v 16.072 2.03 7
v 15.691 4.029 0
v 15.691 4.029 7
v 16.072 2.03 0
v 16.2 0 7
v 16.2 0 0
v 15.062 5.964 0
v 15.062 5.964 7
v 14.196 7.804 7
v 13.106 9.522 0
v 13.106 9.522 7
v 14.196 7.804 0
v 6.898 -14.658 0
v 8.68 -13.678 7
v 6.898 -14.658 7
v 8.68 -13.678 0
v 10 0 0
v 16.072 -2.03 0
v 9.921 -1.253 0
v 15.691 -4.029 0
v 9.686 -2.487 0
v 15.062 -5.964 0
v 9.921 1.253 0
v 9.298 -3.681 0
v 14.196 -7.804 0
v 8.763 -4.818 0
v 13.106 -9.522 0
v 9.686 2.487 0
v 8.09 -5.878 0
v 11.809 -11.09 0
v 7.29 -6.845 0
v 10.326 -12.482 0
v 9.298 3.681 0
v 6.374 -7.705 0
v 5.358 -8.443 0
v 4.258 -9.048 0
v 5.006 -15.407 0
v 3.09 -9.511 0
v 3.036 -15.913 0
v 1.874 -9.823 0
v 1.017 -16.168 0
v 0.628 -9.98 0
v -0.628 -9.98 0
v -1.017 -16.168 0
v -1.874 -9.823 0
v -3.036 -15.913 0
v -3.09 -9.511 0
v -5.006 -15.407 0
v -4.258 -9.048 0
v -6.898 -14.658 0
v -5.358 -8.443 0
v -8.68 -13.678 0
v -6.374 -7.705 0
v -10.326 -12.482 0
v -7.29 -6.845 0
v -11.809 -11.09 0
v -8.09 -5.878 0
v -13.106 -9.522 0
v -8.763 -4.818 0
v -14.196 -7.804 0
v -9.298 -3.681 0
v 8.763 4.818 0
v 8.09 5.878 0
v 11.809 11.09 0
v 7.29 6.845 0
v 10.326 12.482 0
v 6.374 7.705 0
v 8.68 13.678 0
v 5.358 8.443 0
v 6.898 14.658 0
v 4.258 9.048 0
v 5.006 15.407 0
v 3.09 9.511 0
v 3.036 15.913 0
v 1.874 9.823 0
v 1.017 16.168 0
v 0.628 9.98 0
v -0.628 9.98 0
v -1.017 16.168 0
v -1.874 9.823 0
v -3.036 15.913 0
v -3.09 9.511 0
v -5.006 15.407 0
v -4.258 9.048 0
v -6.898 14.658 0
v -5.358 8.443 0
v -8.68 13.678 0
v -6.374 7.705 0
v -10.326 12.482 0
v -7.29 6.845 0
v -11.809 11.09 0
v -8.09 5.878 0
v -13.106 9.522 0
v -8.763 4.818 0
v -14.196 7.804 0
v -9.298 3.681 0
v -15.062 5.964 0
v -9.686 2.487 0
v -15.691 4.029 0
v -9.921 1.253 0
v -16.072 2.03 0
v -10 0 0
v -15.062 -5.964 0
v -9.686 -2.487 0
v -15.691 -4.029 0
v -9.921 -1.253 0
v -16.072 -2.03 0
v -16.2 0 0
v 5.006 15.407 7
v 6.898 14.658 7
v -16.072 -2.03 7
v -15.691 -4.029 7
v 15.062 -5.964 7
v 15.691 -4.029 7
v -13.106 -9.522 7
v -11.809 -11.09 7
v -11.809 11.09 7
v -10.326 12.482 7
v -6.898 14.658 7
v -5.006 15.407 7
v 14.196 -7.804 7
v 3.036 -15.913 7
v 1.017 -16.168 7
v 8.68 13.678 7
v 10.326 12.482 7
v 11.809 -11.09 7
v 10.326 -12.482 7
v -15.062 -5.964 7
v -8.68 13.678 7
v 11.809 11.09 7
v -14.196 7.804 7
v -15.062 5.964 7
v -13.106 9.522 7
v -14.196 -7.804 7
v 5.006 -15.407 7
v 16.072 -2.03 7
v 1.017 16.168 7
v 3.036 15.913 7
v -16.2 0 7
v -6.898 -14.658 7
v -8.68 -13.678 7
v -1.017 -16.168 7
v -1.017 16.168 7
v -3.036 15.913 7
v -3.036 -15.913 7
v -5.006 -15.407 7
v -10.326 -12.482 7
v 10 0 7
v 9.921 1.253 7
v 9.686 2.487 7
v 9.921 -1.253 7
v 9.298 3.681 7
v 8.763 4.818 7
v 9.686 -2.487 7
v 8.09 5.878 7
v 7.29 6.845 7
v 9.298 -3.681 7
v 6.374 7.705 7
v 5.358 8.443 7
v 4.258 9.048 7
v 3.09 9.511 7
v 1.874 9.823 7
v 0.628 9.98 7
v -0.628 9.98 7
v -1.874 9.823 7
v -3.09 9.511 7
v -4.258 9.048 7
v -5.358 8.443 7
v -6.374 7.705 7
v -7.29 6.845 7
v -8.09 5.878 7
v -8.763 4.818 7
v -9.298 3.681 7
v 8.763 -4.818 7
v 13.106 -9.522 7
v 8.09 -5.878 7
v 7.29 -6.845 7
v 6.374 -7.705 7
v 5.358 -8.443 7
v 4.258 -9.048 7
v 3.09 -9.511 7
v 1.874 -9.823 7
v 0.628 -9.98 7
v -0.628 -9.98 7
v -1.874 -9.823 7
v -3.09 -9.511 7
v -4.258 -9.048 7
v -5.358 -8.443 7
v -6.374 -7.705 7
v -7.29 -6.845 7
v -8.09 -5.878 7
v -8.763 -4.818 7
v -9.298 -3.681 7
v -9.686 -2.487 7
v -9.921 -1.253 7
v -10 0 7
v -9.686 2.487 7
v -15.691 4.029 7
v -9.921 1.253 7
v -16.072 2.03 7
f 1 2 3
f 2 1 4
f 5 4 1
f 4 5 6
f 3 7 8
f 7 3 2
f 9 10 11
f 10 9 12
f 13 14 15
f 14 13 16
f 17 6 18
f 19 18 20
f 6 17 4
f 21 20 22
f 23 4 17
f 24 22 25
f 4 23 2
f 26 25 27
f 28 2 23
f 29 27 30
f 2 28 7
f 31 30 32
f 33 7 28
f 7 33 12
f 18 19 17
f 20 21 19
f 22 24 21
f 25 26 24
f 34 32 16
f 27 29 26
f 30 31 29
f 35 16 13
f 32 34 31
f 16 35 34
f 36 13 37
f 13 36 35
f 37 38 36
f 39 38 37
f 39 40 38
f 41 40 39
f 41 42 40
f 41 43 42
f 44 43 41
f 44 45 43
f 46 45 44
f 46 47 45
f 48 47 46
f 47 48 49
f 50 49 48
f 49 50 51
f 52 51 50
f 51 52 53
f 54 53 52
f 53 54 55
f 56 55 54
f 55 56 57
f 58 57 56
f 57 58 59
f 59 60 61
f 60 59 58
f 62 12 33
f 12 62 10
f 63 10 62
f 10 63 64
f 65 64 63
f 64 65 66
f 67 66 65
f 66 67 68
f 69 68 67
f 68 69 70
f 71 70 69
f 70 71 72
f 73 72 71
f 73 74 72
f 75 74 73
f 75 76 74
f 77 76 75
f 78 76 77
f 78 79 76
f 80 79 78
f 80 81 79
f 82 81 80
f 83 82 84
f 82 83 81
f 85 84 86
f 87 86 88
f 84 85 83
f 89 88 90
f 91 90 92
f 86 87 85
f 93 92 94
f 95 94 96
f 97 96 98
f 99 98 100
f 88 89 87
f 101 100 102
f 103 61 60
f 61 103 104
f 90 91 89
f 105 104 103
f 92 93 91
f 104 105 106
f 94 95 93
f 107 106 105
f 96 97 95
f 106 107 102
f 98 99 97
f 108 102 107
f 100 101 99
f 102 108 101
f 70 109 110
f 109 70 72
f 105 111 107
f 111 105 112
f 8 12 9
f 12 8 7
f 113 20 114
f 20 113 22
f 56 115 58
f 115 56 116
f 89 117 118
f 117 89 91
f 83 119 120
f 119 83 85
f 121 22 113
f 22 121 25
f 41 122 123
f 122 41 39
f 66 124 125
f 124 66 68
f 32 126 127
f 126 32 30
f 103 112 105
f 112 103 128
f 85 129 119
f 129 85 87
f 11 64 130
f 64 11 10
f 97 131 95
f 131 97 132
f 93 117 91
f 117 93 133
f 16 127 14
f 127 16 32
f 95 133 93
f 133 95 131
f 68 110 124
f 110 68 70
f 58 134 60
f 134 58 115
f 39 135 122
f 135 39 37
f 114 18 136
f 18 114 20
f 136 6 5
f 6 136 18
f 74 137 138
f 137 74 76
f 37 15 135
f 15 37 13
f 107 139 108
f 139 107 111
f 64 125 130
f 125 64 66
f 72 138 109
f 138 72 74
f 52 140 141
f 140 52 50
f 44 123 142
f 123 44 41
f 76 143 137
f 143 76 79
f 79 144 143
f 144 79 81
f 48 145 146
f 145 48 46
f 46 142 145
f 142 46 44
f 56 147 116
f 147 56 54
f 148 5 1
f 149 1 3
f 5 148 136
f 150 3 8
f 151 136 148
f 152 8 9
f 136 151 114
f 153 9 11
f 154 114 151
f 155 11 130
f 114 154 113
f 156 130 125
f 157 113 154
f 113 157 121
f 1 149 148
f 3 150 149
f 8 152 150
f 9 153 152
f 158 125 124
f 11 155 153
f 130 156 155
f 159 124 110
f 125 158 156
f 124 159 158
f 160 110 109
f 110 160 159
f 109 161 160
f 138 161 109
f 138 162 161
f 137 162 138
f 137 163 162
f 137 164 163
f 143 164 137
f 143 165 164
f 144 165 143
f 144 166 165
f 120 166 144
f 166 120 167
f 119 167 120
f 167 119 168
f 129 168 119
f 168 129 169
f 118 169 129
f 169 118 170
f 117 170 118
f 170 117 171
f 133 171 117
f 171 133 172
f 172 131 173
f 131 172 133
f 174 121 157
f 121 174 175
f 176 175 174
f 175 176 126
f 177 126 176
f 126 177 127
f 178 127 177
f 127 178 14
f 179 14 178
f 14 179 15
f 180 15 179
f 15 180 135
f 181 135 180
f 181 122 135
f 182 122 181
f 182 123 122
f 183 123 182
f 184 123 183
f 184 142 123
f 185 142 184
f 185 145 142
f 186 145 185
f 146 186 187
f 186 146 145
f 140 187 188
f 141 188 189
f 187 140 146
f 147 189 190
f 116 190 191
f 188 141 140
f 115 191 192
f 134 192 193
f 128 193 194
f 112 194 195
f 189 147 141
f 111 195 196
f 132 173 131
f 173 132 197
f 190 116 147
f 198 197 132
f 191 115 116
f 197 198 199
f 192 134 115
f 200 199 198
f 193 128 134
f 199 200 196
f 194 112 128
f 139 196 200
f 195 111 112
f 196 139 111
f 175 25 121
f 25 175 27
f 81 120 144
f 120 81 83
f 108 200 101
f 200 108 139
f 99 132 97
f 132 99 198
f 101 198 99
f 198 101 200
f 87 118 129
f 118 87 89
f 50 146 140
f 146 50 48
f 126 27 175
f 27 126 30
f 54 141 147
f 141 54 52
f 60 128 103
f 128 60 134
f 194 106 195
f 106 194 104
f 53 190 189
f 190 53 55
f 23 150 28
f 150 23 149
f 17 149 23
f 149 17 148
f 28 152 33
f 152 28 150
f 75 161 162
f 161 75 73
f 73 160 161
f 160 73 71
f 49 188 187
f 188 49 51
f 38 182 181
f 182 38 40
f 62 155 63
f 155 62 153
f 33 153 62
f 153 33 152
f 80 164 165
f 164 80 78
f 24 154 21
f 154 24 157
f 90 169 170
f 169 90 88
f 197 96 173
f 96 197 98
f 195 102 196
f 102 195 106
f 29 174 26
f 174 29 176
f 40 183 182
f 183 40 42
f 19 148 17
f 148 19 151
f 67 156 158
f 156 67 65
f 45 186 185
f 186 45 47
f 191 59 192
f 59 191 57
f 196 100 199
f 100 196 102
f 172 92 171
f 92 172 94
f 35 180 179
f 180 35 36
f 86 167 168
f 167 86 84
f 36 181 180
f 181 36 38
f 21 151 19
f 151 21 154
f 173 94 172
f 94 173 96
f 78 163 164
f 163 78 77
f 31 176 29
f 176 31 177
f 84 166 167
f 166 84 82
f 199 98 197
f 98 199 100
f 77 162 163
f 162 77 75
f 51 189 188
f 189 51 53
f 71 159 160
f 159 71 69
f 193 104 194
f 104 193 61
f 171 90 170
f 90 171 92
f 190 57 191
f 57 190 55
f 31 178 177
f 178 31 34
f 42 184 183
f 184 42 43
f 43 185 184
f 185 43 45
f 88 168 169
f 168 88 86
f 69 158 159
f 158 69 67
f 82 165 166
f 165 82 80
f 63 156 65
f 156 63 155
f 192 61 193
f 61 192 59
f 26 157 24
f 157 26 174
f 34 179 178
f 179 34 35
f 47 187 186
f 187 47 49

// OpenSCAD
$fn = 50;


difference() {
	union() {
		cylinder(h = 7, r = 16.2000000000);
	}
	union() {
		cylinder(h = 7, r = 10.0000000000);
	}
}
